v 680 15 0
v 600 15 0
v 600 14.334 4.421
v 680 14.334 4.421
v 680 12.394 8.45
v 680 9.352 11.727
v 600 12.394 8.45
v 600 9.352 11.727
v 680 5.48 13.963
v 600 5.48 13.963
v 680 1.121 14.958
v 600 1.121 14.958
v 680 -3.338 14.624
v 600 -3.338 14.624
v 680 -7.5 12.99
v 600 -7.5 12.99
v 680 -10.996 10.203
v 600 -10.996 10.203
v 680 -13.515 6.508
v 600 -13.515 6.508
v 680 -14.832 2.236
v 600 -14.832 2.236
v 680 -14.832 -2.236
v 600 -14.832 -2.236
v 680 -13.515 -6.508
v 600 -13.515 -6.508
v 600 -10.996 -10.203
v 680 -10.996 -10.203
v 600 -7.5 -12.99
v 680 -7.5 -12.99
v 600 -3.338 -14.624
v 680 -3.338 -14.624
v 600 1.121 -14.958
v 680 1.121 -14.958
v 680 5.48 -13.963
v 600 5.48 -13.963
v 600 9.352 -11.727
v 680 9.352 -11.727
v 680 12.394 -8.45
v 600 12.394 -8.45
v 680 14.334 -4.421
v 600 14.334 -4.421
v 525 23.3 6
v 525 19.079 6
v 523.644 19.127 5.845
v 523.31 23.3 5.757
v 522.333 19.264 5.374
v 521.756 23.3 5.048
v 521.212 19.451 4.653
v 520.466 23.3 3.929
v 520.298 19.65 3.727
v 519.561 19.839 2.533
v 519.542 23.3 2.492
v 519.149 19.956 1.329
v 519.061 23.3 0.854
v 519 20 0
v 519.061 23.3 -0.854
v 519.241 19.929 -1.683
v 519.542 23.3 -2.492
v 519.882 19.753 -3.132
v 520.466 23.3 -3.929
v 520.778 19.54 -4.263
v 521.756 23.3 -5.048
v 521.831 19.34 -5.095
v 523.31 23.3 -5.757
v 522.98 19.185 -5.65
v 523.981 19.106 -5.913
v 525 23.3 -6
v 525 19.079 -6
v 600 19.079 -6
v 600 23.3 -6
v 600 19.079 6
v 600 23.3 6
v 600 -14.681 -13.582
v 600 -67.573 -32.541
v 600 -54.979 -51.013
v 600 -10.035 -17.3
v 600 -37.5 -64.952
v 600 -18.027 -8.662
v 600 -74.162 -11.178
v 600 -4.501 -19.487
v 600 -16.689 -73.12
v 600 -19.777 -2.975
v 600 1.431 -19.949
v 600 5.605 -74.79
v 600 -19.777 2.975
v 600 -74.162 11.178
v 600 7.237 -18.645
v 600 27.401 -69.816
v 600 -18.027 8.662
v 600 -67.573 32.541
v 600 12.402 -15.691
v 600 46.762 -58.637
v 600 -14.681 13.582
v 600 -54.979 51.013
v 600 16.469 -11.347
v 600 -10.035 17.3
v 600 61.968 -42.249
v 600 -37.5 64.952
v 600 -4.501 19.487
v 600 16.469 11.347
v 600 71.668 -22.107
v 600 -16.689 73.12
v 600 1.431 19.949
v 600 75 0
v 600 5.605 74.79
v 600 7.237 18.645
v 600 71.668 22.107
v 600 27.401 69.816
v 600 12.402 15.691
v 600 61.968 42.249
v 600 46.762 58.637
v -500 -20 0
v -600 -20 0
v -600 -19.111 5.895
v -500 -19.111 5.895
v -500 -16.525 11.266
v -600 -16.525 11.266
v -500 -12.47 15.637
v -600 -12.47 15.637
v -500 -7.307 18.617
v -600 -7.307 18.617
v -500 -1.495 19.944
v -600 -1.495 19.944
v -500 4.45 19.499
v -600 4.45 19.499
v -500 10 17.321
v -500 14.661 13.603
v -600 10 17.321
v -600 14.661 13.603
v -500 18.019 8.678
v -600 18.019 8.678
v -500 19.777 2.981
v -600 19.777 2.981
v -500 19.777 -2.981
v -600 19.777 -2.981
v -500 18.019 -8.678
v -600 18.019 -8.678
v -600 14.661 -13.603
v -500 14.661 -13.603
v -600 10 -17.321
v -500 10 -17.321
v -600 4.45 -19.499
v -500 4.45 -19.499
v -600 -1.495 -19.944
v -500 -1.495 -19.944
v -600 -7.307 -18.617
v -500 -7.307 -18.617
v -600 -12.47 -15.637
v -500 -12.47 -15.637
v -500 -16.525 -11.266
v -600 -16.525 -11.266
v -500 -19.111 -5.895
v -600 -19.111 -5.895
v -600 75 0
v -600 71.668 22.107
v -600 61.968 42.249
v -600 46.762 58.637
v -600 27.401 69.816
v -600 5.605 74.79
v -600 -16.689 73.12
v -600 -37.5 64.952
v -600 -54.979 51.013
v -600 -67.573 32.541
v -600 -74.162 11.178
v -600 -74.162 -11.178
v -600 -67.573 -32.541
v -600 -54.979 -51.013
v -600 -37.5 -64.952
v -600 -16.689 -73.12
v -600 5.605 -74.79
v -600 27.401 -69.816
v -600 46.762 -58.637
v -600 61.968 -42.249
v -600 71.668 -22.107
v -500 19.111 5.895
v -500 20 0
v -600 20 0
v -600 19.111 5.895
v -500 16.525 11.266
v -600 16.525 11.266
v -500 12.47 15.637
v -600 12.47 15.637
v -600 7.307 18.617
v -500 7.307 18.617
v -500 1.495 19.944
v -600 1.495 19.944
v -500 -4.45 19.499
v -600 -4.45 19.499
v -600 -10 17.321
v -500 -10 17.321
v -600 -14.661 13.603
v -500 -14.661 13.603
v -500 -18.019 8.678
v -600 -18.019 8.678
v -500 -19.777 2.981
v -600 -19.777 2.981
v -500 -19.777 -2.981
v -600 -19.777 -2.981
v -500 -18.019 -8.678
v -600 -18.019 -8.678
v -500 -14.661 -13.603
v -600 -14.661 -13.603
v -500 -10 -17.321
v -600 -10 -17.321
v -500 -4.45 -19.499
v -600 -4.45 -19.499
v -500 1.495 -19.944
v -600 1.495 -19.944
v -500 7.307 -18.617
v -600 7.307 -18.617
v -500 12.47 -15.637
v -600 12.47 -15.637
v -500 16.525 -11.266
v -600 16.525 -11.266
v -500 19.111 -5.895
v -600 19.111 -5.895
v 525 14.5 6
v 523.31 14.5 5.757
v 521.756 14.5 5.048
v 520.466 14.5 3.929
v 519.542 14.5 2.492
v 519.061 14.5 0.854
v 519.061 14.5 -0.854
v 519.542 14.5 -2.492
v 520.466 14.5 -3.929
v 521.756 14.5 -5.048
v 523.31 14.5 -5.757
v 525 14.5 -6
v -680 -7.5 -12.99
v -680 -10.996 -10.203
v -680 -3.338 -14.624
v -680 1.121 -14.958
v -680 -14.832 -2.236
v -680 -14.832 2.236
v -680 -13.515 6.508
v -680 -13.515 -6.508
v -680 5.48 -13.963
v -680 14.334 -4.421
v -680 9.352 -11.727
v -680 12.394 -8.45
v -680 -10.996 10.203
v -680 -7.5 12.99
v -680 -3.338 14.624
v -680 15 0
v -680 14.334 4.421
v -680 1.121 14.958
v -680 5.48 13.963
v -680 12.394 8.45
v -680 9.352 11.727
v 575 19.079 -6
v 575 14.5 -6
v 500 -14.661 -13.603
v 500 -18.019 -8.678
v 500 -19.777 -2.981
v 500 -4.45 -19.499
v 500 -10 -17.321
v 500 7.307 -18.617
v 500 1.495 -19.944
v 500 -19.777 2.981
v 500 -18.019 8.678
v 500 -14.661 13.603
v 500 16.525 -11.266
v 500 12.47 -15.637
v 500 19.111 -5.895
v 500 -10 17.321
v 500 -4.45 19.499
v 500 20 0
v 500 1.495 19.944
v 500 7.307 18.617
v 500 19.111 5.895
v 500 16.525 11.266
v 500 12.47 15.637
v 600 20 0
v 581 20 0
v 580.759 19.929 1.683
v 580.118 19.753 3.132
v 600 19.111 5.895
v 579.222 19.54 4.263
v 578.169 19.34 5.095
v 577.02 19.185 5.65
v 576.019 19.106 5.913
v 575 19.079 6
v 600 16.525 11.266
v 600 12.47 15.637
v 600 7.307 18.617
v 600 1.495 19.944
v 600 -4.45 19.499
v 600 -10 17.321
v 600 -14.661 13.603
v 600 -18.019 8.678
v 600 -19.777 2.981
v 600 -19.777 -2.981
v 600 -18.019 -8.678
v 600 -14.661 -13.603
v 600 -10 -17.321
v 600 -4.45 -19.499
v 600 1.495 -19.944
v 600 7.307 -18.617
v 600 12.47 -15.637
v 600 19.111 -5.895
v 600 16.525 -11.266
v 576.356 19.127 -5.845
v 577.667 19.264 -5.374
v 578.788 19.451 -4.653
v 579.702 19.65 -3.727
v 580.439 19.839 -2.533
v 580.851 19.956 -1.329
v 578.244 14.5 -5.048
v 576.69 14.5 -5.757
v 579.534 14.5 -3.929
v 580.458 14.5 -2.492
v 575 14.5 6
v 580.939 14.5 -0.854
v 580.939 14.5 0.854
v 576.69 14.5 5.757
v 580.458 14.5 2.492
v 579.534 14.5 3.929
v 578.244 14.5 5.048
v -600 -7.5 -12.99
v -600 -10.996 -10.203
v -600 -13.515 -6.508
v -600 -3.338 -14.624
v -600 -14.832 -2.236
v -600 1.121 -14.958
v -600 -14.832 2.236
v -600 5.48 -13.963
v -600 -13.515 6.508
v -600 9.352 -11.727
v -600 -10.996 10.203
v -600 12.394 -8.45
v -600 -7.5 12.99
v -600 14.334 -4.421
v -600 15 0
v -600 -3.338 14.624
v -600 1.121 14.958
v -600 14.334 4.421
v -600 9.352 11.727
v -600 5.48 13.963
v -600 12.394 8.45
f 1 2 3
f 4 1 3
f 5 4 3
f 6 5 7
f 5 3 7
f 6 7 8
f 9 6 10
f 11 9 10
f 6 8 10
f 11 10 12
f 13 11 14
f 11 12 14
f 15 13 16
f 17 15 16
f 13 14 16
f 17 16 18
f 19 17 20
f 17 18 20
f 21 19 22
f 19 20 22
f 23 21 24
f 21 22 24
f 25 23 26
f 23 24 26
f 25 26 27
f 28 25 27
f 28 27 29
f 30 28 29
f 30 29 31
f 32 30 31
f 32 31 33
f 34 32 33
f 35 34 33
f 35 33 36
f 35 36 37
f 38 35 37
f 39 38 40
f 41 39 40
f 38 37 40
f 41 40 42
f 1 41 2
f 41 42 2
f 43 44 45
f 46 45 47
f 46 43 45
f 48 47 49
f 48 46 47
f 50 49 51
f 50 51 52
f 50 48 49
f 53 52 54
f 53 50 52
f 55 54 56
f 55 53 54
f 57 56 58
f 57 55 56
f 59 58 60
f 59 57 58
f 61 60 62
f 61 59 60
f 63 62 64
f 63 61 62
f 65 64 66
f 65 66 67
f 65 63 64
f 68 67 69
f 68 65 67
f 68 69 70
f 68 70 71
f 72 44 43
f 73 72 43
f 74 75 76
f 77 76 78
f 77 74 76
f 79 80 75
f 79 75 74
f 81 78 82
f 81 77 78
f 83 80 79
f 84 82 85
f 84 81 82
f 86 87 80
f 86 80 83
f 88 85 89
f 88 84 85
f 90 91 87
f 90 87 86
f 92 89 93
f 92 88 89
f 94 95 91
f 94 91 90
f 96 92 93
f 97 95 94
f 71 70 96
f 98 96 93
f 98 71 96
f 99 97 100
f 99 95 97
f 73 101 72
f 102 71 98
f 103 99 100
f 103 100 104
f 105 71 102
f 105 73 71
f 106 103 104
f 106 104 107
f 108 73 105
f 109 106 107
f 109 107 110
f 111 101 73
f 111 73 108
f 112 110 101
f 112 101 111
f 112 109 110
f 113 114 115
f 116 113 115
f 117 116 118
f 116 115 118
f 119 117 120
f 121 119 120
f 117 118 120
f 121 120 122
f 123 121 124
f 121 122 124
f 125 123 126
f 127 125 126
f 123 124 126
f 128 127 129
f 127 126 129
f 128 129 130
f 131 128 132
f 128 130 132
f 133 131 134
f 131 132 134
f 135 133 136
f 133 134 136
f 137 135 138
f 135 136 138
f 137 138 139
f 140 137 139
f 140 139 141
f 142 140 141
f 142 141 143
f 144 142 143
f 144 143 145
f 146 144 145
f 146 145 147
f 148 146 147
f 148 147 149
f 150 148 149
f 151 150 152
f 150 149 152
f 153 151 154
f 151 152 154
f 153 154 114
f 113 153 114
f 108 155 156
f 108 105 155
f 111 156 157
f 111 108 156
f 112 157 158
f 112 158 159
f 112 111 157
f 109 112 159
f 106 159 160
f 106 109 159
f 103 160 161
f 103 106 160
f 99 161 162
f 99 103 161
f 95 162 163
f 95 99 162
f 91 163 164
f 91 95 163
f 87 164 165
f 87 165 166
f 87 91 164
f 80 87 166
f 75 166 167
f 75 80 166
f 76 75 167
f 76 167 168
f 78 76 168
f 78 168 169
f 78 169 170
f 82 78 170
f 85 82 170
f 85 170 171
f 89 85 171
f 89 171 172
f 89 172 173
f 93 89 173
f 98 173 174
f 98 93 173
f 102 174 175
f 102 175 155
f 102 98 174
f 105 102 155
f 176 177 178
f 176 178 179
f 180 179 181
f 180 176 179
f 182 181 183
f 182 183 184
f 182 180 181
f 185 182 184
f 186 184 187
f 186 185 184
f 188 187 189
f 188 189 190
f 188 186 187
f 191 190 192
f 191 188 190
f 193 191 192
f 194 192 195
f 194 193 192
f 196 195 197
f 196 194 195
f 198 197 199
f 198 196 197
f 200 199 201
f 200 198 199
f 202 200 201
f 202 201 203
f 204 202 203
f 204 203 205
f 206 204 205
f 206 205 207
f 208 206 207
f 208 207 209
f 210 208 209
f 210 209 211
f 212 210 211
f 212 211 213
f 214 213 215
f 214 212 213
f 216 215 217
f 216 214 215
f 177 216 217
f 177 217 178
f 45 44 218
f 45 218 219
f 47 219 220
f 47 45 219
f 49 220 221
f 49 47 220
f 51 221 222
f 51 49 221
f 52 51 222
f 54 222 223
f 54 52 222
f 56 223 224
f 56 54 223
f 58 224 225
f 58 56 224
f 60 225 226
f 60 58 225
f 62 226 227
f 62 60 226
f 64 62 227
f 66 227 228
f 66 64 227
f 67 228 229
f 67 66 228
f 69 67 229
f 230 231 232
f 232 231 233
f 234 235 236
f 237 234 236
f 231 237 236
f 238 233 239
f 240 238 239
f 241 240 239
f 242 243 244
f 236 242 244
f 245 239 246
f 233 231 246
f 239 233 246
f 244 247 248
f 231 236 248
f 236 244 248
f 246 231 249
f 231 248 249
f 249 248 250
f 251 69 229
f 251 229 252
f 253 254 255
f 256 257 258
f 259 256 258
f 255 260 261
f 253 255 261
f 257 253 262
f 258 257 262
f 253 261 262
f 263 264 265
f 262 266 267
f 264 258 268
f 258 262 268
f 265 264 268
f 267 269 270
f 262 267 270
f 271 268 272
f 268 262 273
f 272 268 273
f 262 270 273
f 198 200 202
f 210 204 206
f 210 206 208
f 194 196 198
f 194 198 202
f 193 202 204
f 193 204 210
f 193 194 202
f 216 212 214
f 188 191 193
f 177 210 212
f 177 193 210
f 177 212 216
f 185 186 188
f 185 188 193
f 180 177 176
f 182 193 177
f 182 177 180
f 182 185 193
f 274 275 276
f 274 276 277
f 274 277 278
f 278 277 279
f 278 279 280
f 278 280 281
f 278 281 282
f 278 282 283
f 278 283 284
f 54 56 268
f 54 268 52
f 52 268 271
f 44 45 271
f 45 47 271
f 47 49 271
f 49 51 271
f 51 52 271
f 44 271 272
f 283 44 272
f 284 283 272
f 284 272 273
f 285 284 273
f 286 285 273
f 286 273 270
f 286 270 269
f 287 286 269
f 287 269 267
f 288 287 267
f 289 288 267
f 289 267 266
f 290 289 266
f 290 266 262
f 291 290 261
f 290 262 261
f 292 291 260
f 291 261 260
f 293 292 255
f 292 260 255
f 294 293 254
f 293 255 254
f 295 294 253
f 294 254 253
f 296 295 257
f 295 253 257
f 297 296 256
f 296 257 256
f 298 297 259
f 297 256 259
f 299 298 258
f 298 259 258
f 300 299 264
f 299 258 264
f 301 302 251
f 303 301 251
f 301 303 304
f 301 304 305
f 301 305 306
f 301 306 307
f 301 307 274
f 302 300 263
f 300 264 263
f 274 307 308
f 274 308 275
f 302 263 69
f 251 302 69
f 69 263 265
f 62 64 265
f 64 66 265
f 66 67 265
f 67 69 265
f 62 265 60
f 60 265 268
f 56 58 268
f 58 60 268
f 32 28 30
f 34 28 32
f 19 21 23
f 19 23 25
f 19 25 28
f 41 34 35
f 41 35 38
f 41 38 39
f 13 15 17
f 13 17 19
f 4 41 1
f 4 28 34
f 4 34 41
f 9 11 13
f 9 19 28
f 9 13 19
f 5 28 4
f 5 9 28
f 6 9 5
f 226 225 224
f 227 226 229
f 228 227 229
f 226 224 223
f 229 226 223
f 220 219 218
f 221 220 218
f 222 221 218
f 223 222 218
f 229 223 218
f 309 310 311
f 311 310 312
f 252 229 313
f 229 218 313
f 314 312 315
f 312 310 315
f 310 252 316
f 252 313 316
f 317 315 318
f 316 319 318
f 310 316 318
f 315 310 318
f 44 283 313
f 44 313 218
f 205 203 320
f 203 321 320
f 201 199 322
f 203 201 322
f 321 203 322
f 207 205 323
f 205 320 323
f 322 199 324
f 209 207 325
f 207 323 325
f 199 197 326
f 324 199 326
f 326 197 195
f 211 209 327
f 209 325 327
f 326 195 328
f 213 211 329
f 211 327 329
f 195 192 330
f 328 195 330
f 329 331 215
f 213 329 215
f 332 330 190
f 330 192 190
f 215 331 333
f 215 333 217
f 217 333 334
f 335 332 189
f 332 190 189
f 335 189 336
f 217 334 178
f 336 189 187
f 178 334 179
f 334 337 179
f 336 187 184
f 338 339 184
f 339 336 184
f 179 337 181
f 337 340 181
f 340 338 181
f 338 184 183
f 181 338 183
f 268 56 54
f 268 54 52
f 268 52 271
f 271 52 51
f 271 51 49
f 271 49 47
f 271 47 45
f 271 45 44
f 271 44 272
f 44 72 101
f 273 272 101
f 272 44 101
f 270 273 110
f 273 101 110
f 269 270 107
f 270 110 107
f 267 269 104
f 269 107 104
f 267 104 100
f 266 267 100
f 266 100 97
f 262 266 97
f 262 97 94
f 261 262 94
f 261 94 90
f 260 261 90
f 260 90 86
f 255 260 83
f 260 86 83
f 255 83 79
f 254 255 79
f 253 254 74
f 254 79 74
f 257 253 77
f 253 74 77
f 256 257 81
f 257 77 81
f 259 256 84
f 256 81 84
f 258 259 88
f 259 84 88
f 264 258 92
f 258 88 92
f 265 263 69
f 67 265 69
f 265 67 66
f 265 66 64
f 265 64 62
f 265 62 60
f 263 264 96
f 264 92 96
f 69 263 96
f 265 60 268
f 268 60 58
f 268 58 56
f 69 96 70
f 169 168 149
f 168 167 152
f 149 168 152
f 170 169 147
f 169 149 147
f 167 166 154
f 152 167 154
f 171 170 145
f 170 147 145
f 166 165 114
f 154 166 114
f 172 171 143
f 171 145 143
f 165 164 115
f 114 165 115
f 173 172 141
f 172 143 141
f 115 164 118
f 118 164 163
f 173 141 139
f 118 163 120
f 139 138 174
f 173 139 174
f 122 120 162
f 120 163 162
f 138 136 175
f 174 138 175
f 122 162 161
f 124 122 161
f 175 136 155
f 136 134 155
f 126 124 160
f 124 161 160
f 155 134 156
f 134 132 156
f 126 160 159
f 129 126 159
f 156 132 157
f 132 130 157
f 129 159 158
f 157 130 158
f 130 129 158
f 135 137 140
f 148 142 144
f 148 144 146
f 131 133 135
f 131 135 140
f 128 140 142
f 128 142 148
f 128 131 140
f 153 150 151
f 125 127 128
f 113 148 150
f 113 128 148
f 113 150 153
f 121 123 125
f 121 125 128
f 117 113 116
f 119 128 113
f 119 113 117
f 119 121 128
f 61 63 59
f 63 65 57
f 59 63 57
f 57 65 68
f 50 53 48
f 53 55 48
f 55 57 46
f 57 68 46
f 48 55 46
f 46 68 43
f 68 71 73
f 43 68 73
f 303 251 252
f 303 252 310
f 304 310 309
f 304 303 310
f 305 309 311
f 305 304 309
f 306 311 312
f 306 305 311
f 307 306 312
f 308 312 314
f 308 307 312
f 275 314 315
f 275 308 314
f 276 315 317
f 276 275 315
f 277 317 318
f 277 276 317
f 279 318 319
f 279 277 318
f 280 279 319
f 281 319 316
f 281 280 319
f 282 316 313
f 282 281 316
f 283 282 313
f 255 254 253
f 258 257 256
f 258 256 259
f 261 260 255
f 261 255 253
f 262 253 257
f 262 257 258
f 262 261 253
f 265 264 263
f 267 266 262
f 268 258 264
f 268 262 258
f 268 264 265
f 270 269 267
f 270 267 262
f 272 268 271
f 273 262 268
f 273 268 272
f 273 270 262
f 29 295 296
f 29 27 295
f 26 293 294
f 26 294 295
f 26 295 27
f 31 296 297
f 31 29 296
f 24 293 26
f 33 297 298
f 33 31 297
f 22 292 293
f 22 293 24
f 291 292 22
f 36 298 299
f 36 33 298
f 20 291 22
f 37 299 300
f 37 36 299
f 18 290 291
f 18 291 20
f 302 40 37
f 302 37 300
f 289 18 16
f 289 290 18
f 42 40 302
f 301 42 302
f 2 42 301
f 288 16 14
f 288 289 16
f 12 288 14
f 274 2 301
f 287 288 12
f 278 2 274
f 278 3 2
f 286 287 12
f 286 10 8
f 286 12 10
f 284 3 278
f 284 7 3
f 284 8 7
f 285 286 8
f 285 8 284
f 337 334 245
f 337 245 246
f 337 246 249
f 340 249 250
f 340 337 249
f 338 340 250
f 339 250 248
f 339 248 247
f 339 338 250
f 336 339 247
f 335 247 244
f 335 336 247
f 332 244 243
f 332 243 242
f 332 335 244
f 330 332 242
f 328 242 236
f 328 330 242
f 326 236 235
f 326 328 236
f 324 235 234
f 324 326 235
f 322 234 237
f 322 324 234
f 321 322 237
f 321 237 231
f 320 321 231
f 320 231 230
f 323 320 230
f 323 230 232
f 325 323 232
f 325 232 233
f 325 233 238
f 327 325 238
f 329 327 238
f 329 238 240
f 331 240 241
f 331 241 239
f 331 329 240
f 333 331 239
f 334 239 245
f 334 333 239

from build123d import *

# Parameters (mm, degrees)
F0_R      = 75
F1_DEPTH  = 600
F2_R      = 20
F3_DEPTH  = 100
F4_R      = 20
F5_DEPTH  = 100
F6_W      = 4.221216
F6_H      = 12
F7_DEPTH  = 75
F8_R      = 20
F9_DEPTH  = 100
F10_R     = 15
F11_DEPTH = 80
F14_DEPTH = 8.8


with BuildPart() as f1:
    # F0 (on Right) → F1 (new body, symmetric)
    with BuildSketch(Plane.YZ):
        Circle(F0_R)
    extrude(amount=F1_DEPTH, both=True)

    # F2 (on face) → F3 (cut)
    with BuildSketch(Plane(origin=(-600, 0, 0), x_dir=(0, -1, 0), z_dir=(-1, 0, 0))):
        Circle(F2_R)
    extrude(amount=-F3_DEPTH, mode=Mode.SUBTRACT)

    # F4 (on face) → F5 (cut)
    with BuildSketch(Plane.YZ.offset(600)):
        Circle(F4_R)
    extrude(amount=-F5_DEPTH, mode=Mode.SUBTRACT)

    # F6 (on face) → F7 (cut)
    with BuildSketch(Plane.YZ.offset(600)):
        with Locations((21.189392, 0)):
            Rectangle(F6_W, F6_H)
    extrude(amount=-F7_DEPTH, mode=Mode.SUBTRACT)


with BuildPart() as f9:
    # F8 (on face) → F9 (new body)
    with BuildSketch(Plane.YZ.offset(500)):
        Circle(F8_R)
    extrude(amount=F9_DEPTH)

    # F10 (on face) → F11 (join)
    with BuildSketch(Plane.YZ.offset(600)):
        Circle(F10_R)
    extrude(amount=F11_DEPTH)


with BuildPart() as f12_1:
    # F12: instance of F9
    add(f9.part.mirror(Plane.YZ))


with BuildPart() as f14_tool:
    # F13 (on face) → F14 (new body)
    with BuildSketch(Plane.XZ.offset(-23.3)):
        with BuildLine():
            ThreePointArc((525, 6), (519, 0), (525, -6))
            Line((525, -6), (575, -6))
            ThreePointArc((575, -6), (581, 0), (575, 6))
            Line((575, 6), (525, 6))
        make_face()
    extrude(amount=F14_DEPTH)


with BuildPart() as f1_1:
    add(f1.part)

    # F14: cut by f14_tool
    add(f14_tool.part, mode=Mode.SUBTRACT)


with BuildPart() as f9_1:
    add(f9.part)

    # F14: cut by f14_tool
    add(f14_tool.part, mode=Mode.SUBTRACT)


solid = Compound([f12_1.part, f1_1.part, f9_1.part])
